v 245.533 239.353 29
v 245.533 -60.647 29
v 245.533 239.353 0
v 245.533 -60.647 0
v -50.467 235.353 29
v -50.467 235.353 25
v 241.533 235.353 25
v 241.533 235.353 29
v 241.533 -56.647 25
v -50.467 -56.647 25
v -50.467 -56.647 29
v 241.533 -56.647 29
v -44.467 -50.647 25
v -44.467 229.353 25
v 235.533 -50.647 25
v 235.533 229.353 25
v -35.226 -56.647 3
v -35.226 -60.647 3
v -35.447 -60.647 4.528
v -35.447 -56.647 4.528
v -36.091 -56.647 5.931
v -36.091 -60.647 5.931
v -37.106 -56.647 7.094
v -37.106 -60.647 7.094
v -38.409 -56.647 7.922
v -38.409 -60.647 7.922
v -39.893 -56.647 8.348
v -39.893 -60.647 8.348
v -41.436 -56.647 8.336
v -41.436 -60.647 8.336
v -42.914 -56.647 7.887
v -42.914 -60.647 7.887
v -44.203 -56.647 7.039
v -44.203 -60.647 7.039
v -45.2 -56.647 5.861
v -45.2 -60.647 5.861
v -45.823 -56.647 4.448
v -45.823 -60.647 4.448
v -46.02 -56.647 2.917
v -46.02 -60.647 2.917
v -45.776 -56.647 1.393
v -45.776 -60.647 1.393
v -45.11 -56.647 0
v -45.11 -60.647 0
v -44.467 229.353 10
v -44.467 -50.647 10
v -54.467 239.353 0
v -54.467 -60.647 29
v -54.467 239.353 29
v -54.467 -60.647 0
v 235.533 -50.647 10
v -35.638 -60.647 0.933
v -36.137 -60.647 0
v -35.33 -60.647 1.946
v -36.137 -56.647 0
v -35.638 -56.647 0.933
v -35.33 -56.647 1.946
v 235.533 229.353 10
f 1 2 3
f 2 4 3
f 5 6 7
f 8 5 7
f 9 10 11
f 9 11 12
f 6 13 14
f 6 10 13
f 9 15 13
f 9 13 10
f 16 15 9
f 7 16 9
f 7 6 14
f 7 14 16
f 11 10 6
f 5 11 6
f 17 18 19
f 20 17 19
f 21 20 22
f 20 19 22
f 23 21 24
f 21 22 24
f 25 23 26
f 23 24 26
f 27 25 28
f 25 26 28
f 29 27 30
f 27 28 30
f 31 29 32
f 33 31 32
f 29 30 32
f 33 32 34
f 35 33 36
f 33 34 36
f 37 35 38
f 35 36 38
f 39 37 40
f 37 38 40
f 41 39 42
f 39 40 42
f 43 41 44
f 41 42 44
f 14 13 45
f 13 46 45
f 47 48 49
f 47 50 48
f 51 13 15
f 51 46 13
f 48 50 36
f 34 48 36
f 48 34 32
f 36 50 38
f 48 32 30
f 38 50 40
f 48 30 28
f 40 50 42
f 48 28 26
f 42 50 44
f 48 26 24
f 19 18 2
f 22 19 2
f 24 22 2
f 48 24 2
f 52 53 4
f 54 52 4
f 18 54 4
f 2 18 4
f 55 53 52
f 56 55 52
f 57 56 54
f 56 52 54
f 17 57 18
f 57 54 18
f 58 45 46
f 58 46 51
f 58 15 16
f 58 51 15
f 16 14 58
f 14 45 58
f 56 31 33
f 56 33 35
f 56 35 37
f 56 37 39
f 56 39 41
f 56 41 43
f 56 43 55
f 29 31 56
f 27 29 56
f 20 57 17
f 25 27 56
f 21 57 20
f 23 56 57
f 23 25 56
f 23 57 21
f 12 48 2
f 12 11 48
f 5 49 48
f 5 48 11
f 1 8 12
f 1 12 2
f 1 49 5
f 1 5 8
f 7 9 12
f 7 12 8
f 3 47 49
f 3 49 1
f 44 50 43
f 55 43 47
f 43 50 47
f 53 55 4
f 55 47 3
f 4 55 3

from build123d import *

# Parameters (mm, degrees)
F0_W     = 300
F0_H     = 300
F1_DEPTH = 25
F3_T     = -10
F4_DEPTH = 4
F5_W     = 300
F5_H     = 300
F5_W_2   = 292
F5_H_2   = 292
F6_DEPTH = 4


with BuildPart() as f1:
    # F0 (on Top) → F1 (new body)
    with BuildSketch(Plane.XY):
        with Locations((95.5334320664, 89.3530972302)):
            Rectangle(F0_W, F0_H)
    extrude(amount=F1_DEPTH)

    # F3
    f3_openings = [f1.faces().sort_by_distance(p)[0] for p in [
        (95.533432, 89.353097, 25),
    ]]
    offset(amount=F3_T, openings=f3_openings)

    # F2 (on face) → F4 (cut)
    with BuildSketch(Plane.XZ.offset(60.6469027698)):
        with BuildLine():
            ThreePointArc((-36.1368541132, 0), (-35.4589387768, 1.4324265188), (-35.2262808864, 2.9999995604))
            ThreePointArc((-35.2262808864, 2.9999995604), (-42.1910810125, 8.1645687544), (-45.1101618284, 0))
            Line((-45.1101618284, 0), (-36.1368541132, 0))
        make_face()
    extrude(amount=-F4_DEPTH, mode=Mode.SUBTRACT)

    # F5 (on face) → F6 (join)
    with BuildSketch(Plane.XY.offset(25)):
        with Locations((95.5334320664, 89.3530972302)):
            Rectangle(F5_W, F5_H)
        with Locations((95.5334320664, 89.3530972302)):
            Rectangle(F5_W_2, F5_H_2, mode=Mode.SUBTRACT)
    extrude(amount=F6_DEPTH)


solid = f1.part
